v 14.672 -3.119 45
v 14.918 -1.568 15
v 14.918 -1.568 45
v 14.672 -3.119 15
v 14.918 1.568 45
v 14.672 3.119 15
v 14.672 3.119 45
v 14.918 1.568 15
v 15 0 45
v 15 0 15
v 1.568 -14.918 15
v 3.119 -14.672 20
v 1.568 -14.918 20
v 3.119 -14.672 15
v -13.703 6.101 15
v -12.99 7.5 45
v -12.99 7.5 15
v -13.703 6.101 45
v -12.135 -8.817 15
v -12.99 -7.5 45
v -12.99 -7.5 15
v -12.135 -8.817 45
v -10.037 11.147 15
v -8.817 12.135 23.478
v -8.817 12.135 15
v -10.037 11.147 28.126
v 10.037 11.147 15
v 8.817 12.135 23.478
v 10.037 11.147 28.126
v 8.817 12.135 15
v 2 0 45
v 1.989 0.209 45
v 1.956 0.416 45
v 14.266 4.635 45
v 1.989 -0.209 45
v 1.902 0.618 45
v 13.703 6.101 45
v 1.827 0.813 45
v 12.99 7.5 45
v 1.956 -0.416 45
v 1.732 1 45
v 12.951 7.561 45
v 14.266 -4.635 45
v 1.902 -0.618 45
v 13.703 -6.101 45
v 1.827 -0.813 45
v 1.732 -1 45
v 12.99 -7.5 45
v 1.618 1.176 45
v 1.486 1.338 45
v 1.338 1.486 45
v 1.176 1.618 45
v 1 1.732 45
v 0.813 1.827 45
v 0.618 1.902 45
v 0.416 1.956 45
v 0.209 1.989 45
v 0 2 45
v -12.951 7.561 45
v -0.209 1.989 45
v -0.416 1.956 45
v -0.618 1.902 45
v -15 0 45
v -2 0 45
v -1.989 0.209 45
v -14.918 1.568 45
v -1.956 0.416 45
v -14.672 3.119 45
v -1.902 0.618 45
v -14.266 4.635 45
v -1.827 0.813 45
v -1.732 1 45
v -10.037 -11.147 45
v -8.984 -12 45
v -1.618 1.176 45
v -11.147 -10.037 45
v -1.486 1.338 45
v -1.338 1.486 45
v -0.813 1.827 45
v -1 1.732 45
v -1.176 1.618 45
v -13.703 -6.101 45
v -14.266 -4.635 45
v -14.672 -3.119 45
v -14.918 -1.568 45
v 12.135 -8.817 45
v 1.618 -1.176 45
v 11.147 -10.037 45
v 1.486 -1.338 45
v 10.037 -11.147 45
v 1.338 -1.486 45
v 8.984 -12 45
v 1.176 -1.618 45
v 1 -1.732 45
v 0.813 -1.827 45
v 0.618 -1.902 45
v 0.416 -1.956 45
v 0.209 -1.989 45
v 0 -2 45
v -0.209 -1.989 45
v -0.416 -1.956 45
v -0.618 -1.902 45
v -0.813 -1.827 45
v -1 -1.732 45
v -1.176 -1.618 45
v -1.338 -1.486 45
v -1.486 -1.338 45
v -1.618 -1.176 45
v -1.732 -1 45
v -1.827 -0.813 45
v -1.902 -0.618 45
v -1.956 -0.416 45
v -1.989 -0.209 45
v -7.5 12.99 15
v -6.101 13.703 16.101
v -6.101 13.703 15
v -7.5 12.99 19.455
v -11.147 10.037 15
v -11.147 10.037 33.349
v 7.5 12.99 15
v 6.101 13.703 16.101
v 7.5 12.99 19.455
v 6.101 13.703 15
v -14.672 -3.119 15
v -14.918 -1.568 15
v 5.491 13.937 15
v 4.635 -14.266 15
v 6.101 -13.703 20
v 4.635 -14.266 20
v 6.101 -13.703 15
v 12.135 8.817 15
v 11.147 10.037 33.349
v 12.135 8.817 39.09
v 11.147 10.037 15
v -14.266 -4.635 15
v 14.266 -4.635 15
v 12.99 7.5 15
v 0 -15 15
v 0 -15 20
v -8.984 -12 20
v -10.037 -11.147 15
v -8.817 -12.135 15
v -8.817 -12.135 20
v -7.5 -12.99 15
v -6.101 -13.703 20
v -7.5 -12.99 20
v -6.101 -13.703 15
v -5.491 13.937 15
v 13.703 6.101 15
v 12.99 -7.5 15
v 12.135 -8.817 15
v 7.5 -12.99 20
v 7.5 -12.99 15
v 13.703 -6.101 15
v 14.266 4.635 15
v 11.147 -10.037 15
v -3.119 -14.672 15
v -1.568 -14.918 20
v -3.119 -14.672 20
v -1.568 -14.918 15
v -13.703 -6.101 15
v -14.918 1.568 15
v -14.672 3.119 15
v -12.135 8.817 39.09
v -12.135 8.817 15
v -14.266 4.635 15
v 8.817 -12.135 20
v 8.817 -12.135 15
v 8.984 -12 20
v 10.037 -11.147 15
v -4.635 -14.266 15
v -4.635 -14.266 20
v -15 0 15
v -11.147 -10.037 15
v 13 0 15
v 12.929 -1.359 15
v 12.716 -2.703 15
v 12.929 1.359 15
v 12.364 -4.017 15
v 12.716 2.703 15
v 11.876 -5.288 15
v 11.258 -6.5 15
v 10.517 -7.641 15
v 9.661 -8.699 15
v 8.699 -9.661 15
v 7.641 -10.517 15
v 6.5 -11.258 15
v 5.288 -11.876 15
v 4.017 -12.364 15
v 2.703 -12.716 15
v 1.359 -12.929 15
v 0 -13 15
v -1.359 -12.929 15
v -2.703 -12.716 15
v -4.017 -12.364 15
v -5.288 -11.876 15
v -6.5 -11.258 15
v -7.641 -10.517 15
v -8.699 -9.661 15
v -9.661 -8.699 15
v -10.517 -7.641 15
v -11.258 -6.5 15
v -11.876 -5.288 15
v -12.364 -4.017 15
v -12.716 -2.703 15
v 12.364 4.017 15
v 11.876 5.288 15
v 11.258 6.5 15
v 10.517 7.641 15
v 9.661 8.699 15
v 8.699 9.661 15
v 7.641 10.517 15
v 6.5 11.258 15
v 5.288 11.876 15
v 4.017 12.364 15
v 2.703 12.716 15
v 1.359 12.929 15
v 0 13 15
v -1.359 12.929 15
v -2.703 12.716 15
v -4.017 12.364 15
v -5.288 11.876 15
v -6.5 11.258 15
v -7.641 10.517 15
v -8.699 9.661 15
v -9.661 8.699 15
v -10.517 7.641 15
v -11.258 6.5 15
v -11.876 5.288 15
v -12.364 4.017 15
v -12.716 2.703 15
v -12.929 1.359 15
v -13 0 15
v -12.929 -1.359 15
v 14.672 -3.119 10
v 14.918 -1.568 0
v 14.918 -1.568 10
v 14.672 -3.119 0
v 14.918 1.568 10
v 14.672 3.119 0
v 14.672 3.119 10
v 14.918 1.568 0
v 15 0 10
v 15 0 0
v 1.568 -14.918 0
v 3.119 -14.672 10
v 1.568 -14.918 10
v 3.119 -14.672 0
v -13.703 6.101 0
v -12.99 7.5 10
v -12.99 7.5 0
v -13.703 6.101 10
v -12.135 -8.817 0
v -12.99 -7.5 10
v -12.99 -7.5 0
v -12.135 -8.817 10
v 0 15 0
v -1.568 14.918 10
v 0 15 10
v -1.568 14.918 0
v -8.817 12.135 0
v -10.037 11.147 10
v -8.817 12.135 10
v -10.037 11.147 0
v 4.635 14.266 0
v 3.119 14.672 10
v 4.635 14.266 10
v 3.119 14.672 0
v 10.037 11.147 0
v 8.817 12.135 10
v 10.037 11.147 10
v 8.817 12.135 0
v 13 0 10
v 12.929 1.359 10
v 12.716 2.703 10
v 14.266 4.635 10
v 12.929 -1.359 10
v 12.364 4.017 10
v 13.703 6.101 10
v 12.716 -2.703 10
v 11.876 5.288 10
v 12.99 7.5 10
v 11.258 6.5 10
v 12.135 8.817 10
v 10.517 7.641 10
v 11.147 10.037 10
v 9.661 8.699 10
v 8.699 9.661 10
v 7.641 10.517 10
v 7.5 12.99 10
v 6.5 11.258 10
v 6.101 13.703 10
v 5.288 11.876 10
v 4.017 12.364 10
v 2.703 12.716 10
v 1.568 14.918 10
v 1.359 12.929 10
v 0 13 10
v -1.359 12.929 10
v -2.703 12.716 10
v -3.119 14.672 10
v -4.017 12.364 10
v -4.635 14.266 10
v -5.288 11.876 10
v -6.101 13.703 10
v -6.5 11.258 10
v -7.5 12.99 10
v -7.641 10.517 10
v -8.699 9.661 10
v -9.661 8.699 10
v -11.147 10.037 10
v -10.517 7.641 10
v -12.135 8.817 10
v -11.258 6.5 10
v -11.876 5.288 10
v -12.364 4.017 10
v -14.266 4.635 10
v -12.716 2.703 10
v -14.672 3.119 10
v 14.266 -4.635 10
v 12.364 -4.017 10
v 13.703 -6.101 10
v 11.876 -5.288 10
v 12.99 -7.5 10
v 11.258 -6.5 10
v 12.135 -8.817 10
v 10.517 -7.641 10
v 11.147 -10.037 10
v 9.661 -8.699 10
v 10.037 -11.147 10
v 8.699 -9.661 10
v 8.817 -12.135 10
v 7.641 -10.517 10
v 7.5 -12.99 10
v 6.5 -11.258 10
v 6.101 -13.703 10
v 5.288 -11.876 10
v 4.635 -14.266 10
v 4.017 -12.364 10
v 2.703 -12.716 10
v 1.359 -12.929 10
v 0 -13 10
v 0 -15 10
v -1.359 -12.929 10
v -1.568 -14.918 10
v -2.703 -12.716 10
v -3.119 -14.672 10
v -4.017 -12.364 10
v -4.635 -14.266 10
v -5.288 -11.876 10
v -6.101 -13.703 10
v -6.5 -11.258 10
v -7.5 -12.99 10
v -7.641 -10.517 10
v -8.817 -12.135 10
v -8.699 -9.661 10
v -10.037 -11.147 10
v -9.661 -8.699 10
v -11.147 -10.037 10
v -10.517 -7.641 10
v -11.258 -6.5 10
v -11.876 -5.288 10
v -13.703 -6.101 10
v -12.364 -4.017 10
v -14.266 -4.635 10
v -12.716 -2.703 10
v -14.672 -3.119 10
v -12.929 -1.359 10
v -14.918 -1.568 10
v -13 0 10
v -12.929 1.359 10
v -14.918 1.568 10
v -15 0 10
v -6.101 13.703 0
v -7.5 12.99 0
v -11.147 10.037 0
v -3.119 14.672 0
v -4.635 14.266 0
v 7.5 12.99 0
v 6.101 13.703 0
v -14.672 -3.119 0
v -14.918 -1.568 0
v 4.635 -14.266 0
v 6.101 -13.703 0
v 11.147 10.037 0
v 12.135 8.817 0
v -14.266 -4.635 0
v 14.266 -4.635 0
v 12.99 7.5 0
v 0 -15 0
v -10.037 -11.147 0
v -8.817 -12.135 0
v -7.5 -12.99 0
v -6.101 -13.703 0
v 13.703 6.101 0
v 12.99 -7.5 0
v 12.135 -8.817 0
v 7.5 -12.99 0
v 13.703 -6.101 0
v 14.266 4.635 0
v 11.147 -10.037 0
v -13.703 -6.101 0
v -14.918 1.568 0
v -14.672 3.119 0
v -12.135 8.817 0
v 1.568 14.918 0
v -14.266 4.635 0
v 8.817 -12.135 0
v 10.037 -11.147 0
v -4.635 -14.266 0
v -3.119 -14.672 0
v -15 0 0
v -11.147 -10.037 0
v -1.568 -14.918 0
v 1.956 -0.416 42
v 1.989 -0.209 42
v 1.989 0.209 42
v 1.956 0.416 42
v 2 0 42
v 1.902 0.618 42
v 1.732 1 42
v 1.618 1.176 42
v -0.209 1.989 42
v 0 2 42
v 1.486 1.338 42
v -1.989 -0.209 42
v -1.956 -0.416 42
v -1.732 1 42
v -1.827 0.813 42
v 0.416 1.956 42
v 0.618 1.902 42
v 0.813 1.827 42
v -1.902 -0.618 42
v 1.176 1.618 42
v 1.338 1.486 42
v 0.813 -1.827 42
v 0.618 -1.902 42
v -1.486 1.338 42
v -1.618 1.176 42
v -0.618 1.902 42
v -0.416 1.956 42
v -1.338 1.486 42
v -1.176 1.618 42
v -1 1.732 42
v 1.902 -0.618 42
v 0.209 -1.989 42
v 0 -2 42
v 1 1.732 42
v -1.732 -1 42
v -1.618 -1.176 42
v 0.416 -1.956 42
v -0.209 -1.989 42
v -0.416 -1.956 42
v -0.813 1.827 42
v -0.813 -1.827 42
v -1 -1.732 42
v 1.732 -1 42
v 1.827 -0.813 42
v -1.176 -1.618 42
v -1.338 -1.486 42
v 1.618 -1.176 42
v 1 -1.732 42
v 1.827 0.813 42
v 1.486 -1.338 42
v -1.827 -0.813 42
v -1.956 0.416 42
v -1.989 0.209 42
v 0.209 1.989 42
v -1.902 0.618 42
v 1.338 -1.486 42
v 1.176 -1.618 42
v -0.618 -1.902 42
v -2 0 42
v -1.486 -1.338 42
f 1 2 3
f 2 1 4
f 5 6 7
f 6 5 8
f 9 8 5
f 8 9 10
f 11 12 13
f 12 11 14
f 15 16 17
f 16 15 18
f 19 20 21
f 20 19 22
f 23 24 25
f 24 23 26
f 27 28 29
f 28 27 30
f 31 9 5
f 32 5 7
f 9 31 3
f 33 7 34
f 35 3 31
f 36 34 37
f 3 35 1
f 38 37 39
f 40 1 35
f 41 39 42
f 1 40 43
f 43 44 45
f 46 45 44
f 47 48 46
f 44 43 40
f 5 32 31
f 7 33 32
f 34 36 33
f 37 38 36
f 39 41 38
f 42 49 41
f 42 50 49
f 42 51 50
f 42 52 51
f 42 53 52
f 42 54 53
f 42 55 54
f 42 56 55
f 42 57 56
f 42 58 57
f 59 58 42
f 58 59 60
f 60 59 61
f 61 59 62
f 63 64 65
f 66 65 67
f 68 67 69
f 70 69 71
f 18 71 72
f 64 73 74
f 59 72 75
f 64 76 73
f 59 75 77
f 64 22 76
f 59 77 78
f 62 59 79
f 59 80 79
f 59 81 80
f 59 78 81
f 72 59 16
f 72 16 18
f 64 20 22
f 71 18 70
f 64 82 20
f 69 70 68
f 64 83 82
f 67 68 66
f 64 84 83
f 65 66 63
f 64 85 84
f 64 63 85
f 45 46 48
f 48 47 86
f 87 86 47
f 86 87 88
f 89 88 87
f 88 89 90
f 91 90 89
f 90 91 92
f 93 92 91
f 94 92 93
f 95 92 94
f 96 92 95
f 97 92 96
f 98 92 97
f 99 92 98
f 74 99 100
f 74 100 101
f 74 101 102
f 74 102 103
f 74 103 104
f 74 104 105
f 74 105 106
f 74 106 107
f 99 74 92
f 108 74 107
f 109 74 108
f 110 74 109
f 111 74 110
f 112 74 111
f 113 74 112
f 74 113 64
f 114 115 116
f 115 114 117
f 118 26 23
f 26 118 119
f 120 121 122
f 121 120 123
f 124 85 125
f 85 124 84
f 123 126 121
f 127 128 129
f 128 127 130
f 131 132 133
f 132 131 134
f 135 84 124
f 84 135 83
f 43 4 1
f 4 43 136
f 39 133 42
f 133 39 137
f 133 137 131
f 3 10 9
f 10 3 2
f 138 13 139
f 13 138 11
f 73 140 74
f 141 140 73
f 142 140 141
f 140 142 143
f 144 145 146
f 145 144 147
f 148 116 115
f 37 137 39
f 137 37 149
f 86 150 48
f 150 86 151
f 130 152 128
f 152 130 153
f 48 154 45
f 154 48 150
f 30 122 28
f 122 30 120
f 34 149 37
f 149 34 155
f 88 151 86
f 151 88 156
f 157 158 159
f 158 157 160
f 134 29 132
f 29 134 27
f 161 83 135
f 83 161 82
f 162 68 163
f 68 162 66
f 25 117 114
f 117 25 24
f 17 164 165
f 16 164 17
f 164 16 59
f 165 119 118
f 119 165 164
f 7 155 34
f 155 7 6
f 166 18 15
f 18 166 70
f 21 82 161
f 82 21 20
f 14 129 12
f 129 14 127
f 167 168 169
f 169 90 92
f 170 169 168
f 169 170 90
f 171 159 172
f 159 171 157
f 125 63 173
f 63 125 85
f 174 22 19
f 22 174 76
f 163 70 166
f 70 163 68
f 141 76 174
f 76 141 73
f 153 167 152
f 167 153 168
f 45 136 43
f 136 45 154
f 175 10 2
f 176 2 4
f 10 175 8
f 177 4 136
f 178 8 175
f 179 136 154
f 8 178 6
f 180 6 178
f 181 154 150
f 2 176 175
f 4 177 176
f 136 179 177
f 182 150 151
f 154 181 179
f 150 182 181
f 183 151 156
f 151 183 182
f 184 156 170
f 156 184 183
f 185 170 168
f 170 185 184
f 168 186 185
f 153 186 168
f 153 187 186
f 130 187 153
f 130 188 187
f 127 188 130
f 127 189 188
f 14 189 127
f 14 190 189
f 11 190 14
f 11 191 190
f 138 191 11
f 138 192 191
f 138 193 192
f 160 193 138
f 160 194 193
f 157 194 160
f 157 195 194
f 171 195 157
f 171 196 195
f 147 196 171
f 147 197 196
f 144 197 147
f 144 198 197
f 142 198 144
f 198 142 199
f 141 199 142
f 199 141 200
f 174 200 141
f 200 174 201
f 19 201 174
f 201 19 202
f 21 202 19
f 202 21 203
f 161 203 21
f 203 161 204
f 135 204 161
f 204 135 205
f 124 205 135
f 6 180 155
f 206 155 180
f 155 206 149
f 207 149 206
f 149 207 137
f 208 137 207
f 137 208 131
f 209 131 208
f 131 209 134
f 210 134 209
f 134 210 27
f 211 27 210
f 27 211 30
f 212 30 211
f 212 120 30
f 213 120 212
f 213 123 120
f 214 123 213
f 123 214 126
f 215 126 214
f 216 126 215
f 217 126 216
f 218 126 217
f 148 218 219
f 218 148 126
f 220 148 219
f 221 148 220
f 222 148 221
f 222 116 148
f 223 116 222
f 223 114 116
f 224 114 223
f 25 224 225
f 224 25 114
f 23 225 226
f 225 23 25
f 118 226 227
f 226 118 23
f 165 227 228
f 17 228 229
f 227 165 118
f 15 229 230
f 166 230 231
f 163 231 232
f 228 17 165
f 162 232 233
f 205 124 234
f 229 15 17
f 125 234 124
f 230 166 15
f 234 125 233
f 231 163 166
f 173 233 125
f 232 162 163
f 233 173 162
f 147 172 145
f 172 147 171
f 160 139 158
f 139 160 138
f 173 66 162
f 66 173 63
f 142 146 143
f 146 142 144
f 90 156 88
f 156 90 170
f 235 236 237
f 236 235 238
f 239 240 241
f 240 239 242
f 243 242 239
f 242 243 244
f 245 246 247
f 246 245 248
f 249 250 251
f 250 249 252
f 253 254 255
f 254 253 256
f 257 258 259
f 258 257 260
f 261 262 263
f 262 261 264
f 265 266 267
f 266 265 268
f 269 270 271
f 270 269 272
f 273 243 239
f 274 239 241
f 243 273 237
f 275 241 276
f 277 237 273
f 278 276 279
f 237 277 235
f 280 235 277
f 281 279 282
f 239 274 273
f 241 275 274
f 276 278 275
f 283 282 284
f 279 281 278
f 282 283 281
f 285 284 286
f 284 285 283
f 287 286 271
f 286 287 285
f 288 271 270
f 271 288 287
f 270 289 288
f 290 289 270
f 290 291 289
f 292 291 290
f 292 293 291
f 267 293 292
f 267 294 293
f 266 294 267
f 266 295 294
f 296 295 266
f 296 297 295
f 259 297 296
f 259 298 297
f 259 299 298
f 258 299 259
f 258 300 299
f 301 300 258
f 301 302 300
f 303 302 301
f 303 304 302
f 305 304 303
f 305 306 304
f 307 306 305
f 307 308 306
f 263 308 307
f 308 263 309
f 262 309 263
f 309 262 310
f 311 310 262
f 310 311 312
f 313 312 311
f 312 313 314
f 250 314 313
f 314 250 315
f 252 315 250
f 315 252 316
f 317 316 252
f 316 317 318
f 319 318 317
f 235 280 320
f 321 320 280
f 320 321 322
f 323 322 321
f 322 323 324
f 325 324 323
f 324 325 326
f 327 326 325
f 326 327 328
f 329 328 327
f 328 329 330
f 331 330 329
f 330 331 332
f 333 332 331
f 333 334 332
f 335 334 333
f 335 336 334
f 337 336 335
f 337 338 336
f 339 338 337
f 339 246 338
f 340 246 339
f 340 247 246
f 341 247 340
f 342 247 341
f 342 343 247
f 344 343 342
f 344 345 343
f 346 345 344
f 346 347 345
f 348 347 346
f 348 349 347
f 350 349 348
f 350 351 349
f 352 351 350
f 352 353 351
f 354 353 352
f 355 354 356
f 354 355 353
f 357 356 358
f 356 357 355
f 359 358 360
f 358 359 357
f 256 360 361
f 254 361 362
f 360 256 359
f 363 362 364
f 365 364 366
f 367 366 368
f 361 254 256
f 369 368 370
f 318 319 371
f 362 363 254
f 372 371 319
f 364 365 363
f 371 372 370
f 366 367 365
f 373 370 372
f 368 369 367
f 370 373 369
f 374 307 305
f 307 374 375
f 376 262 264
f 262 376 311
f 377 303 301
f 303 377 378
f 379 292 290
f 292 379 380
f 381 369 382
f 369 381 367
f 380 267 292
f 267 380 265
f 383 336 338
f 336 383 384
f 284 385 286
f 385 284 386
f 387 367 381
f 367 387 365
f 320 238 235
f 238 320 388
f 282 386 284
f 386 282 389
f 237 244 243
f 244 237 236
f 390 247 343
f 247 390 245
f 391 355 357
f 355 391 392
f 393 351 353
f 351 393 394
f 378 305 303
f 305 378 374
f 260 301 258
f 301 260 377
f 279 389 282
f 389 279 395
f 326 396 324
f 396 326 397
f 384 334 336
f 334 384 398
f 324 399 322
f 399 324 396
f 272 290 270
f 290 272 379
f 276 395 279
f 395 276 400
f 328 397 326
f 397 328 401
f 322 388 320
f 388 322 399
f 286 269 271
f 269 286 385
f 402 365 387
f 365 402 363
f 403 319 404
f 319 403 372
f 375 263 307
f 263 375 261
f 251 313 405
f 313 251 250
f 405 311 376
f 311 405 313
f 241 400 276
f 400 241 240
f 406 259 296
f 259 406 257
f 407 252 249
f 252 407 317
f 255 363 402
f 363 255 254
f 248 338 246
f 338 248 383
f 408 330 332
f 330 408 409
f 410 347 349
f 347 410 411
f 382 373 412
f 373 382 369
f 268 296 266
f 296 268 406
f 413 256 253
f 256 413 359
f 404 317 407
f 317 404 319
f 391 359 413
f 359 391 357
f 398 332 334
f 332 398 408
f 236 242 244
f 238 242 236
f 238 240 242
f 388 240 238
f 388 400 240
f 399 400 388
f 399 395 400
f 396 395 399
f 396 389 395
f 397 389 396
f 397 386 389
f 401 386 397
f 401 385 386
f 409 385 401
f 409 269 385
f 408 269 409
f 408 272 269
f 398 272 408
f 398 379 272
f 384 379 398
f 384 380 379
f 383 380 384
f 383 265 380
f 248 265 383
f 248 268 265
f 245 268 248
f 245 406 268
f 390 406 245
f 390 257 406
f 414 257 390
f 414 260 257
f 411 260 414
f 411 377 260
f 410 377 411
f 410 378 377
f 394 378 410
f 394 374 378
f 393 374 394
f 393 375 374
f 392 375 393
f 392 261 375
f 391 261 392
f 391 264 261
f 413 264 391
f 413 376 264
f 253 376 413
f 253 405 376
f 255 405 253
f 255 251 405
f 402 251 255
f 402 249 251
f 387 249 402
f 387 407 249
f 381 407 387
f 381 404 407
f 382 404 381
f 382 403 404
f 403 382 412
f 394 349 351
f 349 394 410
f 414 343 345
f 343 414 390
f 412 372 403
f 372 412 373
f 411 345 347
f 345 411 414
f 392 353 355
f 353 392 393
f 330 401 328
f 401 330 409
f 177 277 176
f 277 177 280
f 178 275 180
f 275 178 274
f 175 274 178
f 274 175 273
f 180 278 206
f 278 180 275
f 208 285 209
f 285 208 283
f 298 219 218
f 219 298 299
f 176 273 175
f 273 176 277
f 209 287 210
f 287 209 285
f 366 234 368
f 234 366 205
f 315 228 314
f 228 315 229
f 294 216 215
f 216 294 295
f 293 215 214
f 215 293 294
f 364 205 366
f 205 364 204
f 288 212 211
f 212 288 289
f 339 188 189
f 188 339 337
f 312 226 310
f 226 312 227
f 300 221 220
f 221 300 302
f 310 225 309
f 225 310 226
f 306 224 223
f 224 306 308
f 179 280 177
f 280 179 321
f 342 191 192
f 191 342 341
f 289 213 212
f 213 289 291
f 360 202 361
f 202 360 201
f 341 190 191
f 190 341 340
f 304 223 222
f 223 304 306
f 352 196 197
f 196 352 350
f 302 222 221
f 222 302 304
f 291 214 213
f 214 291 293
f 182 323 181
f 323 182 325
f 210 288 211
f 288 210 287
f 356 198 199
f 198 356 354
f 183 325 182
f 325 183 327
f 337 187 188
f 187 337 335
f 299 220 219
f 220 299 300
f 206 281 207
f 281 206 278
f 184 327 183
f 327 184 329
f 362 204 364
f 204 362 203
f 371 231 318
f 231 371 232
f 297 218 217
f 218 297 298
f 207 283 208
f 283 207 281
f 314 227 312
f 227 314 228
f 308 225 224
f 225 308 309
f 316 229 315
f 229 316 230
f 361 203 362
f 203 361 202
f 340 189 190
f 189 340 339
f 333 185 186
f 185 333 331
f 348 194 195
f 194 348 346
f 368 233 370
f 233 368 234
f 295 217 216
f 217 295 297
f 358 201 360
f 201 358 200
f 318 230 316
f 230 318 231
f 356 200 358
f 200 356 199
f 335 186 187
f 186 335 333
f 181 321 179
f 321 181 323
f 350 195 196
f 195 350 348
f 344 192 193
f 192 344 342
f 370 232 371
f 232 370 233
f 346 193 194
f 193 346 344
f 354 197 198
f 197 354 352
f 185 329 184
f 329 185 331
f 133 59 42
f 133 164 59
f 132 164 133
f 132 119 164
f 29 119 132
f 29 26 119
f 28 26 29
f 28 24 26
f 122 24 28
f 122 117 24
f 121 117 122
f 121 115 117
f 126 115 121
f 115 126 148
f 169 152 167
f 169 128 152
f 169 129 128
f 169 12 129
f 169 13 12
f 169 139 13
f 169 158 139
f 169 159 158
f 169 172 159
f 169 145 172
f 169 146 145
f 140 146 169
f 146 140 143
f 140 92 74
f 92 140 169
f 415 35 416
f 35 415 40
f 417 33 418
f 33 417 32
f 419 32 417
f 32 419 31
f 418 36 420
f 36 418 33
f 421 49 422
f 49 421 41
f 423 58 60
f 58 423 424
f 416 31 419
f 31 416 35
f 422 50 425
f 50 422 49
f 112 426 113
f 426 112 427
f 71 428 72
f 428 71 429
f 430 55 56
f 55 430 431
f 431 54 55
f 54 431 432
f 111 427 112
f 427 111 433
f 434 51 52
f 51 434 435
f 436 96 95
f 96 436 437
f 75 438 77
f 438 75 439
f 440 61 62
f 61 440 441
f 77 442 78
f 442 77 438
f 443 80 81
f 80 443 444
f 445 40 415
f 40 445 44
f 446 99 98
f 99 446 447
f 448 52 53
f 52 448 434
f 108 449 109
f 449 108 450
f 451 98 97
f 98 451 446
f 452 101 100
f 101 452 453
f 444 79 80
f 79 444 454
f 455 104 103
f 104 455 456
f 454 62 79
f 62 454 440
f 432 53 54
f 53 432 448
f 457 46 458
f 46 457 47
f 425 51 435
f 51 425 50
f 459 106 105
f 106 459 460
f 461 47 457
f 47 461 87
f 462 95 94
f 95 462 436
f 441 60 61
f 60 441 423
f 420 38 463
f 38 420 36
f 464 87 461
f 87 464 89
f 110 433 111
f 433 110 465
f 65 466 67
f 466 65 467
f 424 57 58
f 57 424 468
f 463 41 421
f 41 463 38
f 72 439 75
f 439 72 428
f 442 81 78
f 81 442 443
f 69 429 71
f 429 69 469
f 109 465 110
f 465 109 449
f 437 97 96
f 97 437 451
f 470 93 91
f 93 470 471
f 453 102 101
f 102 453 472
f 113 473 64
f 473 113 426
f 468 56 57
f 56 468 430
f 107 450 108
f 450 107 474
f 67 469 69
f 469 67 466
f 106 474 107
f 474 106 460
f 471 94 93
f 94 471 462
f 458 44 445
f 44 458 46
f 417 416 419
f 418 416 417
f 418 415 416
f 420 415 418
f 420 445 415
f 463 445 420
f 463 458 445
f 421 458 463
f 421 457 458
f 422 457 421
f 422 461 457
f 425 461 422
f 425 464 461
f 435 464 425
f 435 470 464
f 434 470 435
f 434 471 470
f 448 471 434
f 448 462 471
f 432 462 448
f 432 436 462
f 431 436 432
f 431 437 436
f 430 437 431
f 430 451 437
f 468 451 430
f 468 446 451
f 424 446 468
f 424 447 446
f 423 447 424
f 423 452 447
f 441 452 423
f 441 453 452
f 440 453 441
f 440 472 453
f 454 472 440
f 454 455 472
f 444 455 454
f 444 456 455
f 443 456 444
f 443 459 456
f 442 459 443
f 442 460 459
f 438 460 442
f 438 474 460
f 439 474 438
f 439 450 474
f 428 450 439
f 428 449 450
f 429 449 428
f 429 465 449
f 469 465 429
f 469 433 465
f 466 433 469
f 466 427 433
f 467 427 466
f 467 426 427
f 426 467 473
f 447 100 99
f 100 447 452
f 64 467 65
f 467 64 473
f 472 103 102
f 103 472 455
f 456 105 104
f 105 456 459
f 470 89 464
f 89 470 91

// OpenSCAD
$fs = 0.1;
$fa = 6;

difference() {
	union() {
		translate([0, 0, 15])
			cylinder(r = 15, h = 30);
		cylinder(r = 15, h = 10);
		cylinder(r = 13, h = 20);
	}
	translate([-25, 15, 10])
		rotate([12, 0, 0])
		cube([ 50, 20, 60]);
	translate([-25, -32, 20])
		cube([ 50, 20, 60]);
	translate([0, 0, 42])
		cylinder(r = 2, h = 5);
}
